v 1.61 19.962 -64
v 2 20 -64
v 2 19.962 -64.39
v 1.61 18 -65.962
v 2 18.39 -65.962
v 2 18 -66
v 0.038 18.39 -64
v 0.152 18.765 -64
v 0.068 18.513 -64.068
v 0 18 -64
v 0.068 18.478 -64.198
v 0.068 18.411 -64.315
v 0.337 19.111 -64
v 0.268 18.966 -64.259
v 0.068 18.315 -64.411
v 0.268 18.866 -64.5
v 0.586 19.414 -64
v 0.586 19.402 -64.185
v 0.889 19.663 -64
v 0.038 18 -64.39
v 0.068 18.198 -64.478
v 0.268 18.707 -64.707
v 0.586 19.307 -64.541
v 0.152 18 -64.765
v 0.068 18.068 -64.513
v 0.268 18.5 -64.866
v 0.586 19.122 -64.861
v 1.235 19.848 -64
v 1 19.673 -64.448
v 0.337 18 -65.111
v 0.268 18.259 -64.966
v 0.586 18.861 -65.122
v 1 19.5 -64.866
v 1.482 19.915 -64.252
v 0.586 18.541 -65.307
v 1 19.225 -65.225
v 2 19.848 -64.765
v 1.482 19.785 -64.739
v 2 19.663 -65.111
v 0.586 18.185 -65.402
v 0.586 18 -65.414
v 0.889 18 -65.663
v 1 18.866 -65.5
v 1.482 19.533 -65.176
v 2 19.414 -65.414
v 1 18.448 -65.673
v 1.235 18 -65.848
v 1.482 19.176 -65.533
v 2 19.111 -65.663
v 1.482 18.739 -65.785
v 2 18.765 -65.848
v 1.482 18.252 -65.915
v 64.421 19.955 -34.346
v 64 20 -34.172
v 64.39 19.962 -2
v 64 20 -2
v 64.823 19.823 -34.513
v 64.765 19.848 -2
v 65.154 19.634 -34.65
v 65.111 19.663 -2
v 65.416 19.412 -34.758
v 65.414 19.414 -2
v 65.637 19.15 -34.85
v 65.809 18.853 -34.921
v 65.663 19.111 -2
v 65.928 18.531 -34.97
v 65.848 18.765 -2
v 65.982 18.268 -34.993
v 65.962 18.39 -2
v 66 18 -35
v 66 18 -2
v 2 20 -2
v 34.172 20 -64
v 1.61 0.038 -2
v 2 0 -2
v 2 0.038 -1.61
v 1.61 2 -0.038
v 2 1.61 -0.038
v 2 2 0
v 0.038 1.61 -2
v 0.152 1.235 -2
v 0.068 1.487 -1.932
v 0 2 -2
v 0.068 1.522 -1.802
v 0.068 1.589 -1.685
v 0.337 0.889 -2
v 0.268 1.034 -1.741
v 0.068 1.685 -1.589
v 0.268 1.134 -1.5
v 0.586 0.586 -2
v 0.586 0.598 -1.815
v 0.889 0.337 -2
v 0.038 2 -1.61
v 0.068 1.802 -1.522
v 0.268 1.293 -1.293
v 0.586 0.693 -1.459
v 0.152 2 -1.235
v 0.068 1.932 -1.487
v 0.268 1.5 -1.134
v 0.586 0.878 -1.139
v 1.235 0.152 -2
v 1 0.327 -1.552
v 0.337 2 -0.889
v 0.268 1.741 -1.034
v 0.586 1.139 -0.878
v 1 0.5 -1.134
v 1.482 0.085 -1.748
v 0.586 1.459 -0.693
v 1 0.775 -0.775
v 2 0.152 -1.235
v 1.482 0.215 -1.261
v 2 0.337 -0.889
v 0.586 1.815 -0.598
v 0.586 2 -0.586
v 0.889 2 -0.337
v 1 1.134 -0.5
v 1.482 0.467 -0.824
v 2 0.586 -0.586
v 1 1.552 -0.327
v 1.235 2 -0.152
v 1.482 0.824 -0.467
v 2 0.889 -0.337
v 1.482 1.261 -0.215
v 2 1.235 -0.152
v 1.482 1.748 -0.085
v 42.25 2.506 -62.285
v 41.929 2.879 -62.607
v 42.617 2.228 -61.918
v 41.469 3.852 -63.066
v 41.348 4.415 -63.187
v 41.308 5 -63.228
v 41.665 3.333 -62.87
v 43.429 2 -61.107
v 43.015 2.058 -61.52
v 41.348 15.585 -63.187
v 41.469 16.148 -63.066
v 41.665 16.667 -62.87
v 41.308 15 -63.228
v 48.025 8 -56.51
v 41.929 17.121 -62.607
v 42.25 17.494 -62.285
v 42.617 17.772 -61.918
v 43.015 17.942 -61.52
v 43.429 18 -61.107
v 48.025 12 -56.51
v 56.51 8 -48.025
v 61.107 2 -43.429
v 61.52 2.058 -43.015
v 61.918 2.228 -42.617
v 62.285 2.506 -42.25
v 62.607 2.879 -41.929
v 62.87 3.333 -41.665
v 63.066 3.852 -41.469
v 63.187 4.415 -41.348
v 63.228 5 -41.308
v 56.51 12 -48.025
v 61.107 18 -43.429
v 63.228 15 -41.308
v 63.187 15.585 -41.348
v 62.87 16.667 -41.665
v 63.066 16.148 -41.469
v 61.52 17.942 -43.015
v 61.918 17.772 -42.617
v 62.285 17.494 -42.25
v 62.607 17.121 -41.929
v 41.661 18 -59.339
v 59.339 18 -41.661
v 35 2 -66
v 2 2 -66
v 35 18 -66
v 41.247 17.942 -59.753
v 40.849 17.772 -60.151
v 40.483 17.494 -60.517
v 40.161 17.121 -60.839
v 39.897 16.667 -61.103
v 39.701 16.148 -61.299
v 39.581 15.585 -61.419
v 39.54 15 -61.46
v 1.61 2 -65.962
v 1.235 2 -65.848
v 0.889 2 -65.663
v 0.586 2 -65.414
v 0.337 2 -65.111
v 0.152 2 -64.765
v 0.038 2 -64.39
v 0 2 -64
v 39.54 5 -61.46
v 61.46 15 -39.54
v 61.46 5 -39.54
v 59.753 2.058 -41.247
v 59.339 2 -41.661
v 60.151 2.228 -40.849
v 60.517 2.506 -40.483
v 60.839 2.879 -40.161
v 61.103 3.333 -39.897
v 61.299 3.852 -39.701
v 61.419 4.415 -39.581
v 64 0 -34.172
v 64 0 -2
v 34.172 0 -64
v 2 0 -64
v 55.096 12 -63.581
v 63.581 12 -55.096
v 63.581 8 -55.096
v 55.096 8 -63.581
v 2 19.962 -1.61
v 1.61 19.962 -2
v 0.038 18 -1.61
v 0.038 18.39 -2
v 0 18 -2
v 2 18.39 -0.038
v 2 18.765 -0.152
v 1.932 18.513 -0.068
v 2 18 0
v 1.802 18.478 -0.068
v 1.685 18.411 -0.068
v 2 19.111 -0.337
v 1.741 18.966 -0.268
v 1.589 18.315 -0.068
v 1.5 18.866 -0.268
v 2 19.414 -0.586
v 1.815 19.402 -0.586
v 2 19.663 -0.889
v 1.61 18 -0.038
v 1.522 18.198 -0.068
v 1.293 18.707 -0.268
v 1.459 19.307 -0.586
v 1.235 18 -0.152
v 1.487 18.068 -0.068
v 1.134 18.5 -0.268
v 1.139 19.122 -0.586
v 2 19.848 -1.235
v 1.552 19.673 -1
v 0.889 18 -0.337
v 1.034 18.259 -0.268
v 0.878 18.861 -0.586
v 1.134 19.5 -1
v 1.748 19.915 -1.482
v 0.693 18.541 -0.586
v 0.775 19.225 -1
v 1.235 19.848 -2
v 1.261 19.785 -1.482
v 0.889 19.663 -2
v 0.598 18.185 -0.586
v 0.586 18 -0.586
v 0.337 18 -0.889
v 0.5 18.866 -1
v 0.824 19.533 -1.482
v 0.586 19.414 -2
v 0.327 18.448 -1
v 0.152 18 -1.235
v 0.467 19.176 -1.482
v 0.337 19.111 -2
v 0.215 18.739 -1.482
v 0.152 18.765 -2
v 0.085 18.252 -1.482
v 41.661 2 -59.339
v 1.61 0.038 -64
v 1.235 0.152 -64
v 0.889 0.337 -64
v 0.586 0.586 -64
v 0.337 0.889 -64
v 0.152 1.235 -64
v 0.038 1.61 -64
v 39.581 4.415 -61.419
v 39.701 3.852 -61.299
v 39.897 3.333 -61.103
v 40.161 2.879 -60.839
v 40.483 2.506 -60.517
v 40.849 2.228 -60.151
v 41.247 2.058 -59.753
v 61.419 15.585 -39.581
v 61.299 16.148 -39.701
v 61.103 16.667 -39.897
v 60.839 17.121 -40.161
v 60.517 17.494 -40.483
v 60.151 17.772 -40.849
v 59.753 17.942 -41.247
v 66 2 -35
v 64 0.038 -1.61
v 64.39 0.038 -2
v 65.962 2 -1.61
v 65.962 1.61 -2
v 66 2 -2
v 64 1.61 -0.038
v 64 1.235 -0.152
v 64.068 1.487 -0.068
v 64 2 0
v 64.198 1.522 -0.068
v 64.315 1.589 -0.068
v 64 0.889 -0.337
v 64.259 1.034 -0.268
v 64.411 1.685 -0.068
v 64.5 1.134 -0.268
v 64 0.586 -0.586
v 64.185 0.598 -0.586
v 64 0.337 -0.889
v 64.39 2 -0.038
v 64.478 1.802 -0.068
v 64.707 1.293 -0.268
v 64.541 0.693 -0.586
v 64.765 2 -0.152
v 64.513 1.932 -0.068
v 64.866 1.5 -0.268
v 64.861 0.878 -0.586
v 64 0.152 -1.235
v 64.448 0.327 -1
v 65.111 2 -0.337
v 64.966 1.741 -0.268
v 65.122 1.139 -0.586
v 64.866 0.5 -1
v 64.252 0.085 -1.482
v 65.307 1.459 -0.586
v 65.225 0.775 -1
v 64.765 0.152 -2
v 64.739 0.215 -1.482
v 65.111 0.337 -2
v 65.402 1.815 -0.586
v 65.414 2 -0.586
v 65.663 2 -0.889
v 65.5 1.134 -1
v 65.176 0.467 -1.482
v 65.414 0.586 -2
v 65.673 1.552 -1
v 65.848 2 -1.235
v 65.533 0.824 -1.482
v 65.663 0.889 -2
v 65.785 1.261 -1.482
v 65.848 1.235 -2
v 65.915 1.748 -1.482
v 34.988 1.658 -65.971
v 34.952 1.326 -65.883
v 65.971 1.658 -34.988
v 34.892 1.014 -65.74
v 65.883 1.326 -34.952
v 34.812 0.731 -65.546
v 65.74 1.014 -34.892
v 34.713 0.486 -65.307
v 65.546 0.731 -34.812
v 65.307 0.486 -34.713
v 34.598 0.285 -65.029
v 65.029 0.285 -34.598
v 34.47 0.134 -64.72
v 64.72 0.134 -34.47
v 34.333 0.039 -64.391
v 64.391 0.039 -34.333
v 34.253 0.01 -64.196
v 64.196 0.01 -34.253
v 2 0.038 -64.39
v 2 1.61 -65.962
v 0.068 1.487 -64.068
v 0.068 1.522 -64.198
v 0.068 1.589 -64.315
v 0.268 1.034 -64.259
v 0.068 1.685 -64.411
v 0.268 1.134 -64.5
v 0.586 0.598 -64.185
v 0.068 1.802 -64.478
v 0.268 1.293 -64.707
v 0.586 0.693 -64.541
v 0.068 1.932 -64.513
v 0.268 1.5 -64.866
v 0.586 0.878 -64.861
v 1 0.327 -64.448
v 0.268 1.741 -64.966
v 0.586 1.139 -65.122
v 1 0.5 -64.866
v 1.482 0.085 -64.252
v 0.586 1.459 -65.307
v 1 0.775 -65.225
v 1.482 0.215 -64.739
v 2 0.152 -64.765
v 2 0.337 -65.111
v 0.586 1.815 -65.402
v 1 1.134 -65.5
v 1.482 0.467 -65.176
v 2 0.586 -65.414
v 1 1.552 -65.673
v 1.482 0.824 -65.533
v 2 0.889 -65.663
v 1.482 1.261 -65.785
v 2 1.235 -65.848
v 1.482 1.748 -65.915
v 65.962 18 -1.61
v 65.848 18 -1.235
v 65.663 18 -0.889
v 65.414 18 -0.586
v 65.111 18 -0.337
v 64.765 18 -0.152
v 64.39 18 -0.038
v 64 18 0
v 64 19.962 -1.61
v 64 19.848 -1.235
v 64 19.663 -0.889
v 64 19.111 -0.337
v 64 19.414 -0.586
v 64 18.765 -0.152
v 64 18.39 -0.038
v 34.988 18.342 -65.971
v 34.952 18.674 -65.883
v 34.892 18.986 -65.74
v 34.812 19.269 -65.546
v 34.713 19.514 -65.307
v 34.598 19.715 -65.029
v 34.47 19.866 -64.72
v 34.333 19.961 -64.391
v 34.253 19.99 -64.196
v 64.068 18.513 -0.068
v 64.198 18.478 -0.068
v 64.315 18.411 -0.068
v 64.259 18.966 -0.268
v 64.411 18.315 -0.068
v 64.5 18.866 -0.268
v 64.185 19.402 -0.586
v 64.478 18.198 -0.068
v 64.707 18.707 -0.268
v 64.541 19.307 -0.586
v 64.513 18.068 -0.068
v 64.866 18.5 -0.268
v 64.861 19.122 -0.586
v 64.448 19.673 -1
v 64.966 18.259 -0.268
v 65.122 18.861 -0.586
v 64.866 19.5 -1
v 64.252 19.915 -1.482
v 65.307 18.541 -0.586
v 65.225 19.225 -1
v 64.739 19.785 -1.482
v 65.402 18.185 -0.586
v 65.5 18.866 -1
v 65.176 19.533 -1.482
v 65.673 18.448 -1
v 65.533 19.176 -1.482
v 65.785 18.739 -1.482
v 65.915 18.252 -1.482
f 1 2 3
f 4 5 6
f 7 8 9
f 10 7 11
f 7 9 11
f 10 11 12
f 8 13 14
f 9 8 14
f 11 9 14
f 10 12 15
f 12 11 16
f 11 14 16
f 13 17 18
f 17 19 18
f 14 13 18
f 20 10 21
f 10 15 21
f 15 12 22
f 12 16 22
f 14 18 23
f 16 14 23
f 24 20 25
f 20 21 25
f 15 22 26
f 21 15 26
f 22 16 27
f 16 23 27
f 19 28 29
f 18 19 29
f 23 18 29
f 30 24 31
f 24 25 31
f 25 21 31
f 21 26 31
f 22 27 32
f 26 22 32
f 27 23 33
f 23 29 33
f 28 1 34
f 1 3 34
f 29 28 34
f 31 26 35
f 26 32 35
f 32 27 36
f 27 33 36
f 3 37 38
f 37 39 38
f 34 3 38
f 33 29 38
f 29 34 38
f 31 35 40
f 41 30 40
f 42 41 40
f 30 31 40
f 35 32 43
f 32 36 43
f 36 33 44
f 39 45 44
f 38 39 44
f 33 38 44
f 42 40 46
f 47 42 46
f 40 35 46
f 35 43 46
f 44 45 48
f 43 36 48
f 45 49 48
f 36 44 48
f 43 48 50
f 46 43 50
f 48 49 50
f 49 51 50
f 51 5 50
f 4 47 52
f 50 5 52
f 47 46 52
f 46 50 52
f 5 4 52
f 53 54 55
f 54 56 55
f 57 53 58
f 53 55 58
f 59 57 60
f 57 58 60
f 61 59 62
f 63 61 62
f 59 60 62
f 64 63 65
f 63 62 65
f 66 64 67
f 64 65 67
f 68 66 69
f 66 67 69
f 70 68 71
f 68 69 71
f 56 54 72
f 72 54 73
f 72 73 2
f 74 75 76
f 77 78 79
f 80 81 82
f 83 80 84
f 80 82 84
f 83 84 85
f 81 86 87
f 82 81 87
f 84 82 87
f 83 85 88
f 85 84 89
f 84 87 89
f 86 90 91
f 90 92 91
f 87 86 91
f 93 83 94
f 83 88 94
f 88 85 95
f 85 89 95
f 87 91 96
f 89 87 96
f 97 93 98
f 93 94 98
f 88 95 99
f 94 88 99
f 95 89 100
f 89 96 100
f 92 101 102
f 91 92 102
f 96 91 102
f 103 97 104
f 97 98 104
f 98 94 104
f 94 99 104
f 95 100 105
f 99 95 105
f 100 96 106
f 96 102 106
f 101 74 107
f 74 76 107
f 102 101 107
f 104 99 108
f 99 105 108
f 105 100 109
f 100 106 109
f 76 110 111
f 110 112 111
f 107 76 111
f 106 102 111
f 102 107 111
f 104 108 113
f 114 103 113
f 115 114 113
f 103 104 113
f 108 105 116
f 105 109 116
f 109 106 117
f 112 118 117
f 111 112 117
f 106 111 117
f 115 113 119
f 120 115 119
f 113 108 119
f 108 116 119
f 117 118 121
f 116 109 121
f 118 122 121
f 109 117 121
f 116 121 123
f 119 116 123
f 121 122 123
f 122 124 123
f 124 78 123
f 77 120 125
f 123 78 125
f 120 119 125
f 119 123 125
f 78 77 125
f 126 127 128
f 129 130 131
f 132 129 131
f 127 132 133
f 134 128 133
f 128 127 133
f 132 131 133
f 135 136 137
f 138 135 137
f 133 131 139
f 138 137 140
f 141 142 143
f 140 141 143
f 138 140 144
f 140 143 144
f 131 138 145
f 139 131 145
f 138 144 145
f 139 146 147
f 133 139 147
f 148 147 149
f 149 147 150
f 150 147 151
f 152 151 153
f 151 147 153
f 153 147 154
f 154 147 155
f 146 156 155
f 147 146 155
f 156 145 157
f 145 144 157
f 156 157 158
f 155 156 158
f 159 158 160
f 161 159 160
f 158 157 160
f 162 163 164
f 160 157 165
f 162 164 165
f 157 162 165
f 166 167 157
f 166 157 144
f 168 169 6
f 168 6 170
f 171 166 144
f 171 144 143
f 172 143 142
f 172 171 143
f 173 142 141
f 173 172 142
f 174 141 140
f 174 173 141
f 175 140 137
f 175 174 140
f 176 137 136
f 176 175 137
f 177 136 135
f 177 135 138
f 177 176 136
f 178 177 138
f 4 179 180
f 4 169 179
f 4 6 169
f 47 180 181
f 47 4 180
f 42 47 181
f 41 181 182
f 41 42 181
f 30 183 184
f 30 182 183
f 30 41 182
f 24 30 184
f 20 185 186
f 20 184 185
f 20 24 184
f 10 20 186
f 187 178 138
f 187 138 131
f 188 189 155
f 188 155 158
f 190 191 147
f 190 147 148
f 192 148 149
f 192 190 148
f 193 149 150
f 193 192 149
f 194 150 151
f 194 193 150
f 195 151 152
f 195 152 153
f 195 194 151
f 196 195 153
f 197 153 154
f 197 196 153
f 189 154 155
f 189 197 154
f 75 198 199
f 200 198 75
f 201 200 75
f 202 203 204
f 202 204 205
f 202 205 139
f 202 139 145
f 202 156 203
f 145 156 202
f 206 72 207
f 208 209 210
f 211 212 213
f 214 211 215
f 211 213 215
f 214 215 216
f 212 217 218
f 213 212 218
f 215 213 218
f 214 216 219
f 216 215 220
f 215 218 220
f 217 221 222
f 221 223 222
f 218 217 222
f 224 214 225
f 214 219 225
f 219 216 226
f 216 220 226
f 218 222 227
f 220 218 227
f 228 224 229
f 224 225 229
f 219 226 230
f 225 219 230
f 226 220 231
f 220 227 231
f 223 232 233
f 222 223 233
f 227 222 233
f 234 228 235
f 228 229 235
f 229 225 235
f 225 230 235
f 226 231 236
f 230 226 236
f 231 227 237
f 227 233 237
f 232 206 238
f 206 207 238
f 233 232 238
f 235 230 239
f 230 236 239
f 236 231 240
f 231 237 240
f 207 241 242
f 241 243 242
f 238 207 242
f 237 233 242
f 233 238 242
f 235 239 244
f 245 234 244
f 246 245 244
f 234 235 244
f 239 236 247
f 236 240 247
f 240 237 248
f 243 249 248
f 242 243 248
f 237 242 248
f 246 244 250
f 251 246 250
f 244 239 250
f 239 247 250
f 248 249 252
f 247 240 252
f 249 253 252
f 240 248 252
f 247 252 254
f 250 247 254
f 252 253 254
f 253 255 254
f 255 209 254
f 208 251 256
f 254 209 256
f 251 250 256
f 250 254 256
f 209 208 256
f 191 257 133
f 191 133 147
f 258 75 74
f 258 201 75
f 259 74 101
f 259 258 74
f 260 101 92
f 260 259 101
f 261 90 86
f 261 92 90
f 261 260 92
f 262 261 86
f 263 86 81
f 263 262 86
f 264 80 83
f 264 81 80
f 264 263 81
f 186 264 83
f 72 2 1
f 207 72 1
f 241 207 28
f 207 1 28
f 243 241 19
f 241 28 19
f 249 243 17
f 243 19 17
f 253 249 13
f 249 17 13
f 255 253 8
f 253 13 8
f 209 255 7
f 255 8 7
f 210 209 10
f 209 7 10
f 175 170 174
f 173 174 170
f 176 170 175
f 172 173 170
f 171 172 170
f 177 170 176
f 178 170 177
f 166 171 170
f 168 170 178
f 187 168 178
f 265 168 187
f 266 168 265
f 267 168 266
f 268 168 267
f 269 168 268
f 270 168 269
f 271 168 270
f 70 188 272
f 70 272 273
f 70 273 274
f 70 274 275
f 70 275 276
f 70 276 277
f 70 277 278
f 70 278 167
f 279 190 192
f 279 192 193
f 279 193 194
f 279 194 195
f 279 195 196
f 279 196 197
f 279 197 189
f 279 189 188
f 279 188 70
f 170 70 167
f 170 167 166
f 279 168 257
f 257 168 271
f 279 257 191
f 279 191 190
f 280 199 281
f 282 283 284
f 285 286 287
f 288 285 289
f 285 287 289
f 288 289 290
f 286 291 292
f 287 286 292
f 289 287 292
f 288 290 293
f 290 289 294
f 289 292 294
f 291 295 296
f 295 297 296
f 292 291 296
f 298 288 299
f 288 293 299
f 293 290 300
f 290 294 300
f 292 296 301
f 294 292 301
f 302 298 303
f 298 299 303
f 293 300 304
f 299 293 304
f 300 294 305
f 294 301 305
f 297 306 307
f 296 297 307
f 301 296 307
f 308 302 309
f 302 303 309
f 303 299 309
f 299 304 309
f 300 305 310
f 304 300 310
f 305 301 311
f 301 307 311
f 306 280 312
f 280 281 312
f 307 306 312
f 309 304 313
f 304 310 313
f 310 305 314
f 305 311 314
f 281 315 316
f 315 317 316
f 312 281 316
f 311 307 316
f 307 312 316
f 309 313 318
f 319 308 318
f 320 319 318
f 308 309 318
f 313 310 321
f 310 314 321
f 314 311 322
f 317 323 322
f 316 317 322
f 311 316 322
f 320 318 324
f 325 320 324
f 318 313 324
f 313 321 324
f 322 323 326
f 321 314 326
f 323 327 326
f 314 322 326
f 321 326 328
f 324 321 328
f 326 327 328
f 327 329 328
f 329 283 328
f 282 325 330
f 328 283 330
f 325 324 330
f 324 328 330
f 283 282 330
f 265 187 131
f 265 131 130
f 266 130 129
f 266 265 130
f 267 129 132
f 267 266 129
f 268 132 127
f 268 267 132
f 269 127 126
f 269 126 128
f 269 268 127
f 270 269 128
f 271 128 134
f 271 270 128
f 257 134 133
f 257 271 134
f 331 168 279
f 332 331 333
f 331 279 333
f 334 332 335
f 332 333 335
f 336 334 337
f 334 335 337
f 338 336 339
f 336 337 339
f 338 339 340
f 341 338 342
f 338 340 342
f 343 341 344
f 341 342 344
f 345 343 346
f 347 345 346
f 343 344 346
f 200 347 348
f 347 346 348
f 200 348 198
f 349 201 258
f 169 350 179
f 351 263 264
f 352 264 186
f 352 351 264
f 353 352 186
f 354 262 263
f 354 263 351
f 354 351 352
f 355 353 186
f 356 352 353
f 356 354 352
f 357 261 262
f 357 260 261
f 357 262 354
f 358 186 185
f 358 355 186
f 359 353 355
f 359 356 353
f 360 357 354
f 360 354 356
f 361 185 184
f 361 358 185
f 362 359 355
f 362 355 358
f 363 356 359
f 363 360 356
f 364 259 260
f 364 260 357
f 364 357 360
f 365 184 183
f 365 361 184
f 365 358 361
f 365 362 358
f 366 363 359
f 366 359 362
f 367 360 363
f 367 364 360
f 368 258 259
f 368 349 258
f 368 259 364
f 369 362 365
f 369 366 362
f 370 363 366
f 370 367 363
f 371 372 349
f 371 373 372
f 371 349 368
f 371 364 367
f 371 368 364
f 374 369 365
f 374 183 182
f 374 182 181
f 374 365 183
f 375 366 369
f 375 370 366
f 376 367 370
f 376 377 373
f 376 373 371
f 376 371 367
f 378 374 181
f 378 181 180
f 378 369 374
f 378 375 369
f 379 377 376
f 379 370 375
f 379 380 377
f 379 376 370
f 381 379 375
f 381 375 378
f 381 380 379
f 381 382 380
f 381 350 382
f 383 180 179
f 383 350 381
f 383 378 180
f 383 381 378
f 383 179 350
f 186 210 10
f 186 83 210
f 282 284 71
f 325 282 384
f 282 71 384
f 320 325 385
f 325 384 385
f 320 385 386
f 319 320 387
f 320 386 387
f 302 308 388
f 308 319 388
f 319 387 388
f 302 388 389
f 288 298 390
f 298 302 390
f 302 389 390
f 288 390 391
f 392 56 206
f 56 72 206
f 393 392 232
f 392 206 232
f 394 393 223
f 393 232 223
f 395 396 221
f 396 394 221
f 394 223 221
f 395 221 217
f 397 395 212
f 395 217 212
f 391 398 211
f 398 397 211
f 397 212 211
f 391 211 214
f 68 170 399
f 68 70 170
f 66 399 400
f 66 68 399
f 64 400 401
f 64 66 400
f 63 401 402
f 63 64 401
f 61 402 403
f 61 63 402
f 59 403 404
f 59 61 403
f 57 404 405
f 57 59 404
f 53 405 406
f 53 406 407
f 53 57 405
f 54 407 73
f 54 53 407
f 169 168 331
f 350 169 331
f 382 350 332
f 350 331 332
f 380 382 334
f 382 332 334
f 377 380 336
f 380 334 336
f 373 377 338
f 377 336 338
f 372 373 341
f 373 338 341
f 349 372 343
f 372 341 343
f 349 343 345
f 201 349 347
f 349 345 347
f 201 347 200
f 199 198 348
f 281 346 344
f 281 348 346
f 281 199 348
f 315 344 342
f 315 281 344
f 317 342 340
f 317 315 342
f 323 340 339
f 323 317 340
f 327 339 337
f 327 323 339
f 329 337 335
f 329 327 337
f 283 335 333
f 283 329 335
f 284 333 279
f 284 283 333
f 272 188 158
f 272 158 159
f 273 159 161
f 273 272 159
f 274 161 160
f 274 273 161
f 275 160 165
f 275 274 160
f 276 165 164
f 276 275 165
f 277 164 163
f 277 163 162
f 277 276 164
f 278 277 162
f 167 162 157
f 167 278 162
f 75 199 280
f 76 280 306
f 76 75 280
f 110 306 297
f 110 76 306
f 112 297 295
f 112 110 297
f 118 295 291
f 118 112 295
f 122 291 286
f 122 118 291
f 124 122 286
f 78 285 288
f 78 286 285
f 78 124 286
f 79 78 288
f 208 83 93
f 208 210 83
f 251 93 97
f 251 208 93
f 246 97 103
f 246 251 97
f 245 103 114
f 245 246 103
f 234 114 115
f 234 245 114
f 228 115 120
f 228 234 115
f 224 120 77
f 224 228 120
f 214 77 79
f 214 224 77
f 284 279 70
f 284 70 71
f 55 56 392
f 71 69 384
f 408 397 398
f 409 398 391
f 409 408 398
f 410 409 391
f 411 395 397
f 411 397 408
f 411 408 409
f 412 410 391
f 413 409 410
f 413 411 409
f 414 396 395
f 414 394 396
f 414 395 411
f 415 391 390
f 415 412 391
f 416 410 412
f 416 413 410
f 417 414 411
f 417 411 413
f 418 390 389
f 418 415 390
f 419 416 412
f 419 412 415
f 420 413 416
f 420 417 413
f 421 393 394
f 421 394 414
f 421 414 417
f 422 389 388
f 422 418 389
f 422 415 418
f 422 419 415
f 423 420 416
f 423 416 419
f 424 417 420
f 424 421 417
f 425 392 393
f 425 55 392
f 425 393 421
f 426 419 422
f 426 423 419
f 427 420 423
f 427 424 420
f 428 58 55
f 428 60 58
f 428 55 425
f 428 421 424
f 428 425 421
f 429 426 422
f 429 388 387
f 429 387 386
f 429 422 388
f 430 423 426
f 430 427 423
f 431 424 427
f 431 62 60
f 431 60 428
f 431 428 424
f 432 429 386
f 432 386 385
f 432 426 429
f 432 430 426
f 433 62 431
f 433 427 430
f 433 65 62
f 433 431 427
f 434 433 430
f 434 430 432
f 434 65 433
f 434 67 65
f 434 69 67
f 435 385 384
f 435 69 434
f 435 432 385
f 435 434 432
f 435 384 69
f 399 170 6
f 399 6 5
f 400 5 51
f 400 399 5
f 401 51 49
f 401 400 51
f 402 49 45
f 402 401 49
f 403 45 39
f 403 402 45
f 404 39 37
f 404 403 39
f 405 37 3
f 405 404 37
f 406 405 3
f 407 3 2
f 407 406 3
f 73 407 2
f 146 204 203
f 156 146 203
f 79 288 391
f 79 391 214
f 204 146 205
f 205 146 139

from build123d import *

# Parameters (mm, degrees)
EXTRUDE_1_DEPTH = 20
EXTRUDE_2_DEPTH = 2.5
SKETCH_3_W      = 12
SKETCH_3_H      = 4
EXTRUDE_3_DEPTH = 10
FILLET_1_R      = 2


with BuildPart() as part:
    # 草图1 → 凸台-拉伸1 (new body)
    with BuildSketch(Plane(origin=(0, 0, 0), x_dir=(1, 0, 0), z_dir=(0, 1, 0))):
        Polygon((35, 66), (66, 35), (66, 0), (0, 0), (0, 66), align=None)
    extrude(amount=EXTRUDE_1_DEPTH)

    # 草图2 → 凸台-拉伸2 (add)
    with BuildSketch(Plane(origin=(50.5, 0, -50.5), x_dir=(-0.7071067811865475, 0, -0.7071067811865477), z_dir=(0.7071067811865477, 0, -0.7071067811865475))):
        with BuildLine():
            Line((15.5, 15), (15.5, 5))
            ThreePointArc((15.5, 5), (14.621320344, 2.878679656), (12.5, 2))
            Line((12.5, 2), (-12.5, 2))
            ThreePointArc((-12.5, 2), (-14.621320344, 2.878679656), (-15.5, 5))
            Line((-15.5, 5), (-15.5, 15))
            ThreePointArc((-15.5, 15), (-14.621320344, 17.121320344), (-12.5, 18))
            Line((-12.5, 18), (12.5, 18))
            ThreePointArc((12.5, 18), (14.621320344, 17.121320344), (15.5, 15))
        make_face()
    extrude(amount=EXTRUDE_2_DEPTH)

    # 草图3 → 凸台-拉伸3 (add)
    with BuildSketch(Plane(origin=(52.267766953, 0, -52.267766953), x_dir=(-0.7071067811865476, 0, -0.7071067811865476), z_dir=(0.7071067811865476, 0, -0.7071067811865476))):
        with Locations((0, 10)):
            Rectangle(SKETCH_3_W, SKETCH_3_H)
    extrude(amount=EXTRUDE_3_DEPTH)

    # 圆角1
    fillet_1_edges = [part.edges().sort_by_distance(p)[0] for p in [
        (66, 20, -17.5),
        (50.5, 20, -50.5),
        (17.5, 20, -66),
        (0, 20, -33),
        (17.5, 0, -66),
        (50.5, 0, -50.5),
        (66, 0, -17.5),
        (33, 0, 0),
        (0, 0, -33),
        (33, 20, 0),
        (0, 10, -66),
        (66, 10, 0),
        (0, 10, 0),
    ]]
    fillet(fillet_1_edges, radius=FILLET_1_R - 0.0001)  # a hair under: the kernel refuses the full size


solid = part.part
